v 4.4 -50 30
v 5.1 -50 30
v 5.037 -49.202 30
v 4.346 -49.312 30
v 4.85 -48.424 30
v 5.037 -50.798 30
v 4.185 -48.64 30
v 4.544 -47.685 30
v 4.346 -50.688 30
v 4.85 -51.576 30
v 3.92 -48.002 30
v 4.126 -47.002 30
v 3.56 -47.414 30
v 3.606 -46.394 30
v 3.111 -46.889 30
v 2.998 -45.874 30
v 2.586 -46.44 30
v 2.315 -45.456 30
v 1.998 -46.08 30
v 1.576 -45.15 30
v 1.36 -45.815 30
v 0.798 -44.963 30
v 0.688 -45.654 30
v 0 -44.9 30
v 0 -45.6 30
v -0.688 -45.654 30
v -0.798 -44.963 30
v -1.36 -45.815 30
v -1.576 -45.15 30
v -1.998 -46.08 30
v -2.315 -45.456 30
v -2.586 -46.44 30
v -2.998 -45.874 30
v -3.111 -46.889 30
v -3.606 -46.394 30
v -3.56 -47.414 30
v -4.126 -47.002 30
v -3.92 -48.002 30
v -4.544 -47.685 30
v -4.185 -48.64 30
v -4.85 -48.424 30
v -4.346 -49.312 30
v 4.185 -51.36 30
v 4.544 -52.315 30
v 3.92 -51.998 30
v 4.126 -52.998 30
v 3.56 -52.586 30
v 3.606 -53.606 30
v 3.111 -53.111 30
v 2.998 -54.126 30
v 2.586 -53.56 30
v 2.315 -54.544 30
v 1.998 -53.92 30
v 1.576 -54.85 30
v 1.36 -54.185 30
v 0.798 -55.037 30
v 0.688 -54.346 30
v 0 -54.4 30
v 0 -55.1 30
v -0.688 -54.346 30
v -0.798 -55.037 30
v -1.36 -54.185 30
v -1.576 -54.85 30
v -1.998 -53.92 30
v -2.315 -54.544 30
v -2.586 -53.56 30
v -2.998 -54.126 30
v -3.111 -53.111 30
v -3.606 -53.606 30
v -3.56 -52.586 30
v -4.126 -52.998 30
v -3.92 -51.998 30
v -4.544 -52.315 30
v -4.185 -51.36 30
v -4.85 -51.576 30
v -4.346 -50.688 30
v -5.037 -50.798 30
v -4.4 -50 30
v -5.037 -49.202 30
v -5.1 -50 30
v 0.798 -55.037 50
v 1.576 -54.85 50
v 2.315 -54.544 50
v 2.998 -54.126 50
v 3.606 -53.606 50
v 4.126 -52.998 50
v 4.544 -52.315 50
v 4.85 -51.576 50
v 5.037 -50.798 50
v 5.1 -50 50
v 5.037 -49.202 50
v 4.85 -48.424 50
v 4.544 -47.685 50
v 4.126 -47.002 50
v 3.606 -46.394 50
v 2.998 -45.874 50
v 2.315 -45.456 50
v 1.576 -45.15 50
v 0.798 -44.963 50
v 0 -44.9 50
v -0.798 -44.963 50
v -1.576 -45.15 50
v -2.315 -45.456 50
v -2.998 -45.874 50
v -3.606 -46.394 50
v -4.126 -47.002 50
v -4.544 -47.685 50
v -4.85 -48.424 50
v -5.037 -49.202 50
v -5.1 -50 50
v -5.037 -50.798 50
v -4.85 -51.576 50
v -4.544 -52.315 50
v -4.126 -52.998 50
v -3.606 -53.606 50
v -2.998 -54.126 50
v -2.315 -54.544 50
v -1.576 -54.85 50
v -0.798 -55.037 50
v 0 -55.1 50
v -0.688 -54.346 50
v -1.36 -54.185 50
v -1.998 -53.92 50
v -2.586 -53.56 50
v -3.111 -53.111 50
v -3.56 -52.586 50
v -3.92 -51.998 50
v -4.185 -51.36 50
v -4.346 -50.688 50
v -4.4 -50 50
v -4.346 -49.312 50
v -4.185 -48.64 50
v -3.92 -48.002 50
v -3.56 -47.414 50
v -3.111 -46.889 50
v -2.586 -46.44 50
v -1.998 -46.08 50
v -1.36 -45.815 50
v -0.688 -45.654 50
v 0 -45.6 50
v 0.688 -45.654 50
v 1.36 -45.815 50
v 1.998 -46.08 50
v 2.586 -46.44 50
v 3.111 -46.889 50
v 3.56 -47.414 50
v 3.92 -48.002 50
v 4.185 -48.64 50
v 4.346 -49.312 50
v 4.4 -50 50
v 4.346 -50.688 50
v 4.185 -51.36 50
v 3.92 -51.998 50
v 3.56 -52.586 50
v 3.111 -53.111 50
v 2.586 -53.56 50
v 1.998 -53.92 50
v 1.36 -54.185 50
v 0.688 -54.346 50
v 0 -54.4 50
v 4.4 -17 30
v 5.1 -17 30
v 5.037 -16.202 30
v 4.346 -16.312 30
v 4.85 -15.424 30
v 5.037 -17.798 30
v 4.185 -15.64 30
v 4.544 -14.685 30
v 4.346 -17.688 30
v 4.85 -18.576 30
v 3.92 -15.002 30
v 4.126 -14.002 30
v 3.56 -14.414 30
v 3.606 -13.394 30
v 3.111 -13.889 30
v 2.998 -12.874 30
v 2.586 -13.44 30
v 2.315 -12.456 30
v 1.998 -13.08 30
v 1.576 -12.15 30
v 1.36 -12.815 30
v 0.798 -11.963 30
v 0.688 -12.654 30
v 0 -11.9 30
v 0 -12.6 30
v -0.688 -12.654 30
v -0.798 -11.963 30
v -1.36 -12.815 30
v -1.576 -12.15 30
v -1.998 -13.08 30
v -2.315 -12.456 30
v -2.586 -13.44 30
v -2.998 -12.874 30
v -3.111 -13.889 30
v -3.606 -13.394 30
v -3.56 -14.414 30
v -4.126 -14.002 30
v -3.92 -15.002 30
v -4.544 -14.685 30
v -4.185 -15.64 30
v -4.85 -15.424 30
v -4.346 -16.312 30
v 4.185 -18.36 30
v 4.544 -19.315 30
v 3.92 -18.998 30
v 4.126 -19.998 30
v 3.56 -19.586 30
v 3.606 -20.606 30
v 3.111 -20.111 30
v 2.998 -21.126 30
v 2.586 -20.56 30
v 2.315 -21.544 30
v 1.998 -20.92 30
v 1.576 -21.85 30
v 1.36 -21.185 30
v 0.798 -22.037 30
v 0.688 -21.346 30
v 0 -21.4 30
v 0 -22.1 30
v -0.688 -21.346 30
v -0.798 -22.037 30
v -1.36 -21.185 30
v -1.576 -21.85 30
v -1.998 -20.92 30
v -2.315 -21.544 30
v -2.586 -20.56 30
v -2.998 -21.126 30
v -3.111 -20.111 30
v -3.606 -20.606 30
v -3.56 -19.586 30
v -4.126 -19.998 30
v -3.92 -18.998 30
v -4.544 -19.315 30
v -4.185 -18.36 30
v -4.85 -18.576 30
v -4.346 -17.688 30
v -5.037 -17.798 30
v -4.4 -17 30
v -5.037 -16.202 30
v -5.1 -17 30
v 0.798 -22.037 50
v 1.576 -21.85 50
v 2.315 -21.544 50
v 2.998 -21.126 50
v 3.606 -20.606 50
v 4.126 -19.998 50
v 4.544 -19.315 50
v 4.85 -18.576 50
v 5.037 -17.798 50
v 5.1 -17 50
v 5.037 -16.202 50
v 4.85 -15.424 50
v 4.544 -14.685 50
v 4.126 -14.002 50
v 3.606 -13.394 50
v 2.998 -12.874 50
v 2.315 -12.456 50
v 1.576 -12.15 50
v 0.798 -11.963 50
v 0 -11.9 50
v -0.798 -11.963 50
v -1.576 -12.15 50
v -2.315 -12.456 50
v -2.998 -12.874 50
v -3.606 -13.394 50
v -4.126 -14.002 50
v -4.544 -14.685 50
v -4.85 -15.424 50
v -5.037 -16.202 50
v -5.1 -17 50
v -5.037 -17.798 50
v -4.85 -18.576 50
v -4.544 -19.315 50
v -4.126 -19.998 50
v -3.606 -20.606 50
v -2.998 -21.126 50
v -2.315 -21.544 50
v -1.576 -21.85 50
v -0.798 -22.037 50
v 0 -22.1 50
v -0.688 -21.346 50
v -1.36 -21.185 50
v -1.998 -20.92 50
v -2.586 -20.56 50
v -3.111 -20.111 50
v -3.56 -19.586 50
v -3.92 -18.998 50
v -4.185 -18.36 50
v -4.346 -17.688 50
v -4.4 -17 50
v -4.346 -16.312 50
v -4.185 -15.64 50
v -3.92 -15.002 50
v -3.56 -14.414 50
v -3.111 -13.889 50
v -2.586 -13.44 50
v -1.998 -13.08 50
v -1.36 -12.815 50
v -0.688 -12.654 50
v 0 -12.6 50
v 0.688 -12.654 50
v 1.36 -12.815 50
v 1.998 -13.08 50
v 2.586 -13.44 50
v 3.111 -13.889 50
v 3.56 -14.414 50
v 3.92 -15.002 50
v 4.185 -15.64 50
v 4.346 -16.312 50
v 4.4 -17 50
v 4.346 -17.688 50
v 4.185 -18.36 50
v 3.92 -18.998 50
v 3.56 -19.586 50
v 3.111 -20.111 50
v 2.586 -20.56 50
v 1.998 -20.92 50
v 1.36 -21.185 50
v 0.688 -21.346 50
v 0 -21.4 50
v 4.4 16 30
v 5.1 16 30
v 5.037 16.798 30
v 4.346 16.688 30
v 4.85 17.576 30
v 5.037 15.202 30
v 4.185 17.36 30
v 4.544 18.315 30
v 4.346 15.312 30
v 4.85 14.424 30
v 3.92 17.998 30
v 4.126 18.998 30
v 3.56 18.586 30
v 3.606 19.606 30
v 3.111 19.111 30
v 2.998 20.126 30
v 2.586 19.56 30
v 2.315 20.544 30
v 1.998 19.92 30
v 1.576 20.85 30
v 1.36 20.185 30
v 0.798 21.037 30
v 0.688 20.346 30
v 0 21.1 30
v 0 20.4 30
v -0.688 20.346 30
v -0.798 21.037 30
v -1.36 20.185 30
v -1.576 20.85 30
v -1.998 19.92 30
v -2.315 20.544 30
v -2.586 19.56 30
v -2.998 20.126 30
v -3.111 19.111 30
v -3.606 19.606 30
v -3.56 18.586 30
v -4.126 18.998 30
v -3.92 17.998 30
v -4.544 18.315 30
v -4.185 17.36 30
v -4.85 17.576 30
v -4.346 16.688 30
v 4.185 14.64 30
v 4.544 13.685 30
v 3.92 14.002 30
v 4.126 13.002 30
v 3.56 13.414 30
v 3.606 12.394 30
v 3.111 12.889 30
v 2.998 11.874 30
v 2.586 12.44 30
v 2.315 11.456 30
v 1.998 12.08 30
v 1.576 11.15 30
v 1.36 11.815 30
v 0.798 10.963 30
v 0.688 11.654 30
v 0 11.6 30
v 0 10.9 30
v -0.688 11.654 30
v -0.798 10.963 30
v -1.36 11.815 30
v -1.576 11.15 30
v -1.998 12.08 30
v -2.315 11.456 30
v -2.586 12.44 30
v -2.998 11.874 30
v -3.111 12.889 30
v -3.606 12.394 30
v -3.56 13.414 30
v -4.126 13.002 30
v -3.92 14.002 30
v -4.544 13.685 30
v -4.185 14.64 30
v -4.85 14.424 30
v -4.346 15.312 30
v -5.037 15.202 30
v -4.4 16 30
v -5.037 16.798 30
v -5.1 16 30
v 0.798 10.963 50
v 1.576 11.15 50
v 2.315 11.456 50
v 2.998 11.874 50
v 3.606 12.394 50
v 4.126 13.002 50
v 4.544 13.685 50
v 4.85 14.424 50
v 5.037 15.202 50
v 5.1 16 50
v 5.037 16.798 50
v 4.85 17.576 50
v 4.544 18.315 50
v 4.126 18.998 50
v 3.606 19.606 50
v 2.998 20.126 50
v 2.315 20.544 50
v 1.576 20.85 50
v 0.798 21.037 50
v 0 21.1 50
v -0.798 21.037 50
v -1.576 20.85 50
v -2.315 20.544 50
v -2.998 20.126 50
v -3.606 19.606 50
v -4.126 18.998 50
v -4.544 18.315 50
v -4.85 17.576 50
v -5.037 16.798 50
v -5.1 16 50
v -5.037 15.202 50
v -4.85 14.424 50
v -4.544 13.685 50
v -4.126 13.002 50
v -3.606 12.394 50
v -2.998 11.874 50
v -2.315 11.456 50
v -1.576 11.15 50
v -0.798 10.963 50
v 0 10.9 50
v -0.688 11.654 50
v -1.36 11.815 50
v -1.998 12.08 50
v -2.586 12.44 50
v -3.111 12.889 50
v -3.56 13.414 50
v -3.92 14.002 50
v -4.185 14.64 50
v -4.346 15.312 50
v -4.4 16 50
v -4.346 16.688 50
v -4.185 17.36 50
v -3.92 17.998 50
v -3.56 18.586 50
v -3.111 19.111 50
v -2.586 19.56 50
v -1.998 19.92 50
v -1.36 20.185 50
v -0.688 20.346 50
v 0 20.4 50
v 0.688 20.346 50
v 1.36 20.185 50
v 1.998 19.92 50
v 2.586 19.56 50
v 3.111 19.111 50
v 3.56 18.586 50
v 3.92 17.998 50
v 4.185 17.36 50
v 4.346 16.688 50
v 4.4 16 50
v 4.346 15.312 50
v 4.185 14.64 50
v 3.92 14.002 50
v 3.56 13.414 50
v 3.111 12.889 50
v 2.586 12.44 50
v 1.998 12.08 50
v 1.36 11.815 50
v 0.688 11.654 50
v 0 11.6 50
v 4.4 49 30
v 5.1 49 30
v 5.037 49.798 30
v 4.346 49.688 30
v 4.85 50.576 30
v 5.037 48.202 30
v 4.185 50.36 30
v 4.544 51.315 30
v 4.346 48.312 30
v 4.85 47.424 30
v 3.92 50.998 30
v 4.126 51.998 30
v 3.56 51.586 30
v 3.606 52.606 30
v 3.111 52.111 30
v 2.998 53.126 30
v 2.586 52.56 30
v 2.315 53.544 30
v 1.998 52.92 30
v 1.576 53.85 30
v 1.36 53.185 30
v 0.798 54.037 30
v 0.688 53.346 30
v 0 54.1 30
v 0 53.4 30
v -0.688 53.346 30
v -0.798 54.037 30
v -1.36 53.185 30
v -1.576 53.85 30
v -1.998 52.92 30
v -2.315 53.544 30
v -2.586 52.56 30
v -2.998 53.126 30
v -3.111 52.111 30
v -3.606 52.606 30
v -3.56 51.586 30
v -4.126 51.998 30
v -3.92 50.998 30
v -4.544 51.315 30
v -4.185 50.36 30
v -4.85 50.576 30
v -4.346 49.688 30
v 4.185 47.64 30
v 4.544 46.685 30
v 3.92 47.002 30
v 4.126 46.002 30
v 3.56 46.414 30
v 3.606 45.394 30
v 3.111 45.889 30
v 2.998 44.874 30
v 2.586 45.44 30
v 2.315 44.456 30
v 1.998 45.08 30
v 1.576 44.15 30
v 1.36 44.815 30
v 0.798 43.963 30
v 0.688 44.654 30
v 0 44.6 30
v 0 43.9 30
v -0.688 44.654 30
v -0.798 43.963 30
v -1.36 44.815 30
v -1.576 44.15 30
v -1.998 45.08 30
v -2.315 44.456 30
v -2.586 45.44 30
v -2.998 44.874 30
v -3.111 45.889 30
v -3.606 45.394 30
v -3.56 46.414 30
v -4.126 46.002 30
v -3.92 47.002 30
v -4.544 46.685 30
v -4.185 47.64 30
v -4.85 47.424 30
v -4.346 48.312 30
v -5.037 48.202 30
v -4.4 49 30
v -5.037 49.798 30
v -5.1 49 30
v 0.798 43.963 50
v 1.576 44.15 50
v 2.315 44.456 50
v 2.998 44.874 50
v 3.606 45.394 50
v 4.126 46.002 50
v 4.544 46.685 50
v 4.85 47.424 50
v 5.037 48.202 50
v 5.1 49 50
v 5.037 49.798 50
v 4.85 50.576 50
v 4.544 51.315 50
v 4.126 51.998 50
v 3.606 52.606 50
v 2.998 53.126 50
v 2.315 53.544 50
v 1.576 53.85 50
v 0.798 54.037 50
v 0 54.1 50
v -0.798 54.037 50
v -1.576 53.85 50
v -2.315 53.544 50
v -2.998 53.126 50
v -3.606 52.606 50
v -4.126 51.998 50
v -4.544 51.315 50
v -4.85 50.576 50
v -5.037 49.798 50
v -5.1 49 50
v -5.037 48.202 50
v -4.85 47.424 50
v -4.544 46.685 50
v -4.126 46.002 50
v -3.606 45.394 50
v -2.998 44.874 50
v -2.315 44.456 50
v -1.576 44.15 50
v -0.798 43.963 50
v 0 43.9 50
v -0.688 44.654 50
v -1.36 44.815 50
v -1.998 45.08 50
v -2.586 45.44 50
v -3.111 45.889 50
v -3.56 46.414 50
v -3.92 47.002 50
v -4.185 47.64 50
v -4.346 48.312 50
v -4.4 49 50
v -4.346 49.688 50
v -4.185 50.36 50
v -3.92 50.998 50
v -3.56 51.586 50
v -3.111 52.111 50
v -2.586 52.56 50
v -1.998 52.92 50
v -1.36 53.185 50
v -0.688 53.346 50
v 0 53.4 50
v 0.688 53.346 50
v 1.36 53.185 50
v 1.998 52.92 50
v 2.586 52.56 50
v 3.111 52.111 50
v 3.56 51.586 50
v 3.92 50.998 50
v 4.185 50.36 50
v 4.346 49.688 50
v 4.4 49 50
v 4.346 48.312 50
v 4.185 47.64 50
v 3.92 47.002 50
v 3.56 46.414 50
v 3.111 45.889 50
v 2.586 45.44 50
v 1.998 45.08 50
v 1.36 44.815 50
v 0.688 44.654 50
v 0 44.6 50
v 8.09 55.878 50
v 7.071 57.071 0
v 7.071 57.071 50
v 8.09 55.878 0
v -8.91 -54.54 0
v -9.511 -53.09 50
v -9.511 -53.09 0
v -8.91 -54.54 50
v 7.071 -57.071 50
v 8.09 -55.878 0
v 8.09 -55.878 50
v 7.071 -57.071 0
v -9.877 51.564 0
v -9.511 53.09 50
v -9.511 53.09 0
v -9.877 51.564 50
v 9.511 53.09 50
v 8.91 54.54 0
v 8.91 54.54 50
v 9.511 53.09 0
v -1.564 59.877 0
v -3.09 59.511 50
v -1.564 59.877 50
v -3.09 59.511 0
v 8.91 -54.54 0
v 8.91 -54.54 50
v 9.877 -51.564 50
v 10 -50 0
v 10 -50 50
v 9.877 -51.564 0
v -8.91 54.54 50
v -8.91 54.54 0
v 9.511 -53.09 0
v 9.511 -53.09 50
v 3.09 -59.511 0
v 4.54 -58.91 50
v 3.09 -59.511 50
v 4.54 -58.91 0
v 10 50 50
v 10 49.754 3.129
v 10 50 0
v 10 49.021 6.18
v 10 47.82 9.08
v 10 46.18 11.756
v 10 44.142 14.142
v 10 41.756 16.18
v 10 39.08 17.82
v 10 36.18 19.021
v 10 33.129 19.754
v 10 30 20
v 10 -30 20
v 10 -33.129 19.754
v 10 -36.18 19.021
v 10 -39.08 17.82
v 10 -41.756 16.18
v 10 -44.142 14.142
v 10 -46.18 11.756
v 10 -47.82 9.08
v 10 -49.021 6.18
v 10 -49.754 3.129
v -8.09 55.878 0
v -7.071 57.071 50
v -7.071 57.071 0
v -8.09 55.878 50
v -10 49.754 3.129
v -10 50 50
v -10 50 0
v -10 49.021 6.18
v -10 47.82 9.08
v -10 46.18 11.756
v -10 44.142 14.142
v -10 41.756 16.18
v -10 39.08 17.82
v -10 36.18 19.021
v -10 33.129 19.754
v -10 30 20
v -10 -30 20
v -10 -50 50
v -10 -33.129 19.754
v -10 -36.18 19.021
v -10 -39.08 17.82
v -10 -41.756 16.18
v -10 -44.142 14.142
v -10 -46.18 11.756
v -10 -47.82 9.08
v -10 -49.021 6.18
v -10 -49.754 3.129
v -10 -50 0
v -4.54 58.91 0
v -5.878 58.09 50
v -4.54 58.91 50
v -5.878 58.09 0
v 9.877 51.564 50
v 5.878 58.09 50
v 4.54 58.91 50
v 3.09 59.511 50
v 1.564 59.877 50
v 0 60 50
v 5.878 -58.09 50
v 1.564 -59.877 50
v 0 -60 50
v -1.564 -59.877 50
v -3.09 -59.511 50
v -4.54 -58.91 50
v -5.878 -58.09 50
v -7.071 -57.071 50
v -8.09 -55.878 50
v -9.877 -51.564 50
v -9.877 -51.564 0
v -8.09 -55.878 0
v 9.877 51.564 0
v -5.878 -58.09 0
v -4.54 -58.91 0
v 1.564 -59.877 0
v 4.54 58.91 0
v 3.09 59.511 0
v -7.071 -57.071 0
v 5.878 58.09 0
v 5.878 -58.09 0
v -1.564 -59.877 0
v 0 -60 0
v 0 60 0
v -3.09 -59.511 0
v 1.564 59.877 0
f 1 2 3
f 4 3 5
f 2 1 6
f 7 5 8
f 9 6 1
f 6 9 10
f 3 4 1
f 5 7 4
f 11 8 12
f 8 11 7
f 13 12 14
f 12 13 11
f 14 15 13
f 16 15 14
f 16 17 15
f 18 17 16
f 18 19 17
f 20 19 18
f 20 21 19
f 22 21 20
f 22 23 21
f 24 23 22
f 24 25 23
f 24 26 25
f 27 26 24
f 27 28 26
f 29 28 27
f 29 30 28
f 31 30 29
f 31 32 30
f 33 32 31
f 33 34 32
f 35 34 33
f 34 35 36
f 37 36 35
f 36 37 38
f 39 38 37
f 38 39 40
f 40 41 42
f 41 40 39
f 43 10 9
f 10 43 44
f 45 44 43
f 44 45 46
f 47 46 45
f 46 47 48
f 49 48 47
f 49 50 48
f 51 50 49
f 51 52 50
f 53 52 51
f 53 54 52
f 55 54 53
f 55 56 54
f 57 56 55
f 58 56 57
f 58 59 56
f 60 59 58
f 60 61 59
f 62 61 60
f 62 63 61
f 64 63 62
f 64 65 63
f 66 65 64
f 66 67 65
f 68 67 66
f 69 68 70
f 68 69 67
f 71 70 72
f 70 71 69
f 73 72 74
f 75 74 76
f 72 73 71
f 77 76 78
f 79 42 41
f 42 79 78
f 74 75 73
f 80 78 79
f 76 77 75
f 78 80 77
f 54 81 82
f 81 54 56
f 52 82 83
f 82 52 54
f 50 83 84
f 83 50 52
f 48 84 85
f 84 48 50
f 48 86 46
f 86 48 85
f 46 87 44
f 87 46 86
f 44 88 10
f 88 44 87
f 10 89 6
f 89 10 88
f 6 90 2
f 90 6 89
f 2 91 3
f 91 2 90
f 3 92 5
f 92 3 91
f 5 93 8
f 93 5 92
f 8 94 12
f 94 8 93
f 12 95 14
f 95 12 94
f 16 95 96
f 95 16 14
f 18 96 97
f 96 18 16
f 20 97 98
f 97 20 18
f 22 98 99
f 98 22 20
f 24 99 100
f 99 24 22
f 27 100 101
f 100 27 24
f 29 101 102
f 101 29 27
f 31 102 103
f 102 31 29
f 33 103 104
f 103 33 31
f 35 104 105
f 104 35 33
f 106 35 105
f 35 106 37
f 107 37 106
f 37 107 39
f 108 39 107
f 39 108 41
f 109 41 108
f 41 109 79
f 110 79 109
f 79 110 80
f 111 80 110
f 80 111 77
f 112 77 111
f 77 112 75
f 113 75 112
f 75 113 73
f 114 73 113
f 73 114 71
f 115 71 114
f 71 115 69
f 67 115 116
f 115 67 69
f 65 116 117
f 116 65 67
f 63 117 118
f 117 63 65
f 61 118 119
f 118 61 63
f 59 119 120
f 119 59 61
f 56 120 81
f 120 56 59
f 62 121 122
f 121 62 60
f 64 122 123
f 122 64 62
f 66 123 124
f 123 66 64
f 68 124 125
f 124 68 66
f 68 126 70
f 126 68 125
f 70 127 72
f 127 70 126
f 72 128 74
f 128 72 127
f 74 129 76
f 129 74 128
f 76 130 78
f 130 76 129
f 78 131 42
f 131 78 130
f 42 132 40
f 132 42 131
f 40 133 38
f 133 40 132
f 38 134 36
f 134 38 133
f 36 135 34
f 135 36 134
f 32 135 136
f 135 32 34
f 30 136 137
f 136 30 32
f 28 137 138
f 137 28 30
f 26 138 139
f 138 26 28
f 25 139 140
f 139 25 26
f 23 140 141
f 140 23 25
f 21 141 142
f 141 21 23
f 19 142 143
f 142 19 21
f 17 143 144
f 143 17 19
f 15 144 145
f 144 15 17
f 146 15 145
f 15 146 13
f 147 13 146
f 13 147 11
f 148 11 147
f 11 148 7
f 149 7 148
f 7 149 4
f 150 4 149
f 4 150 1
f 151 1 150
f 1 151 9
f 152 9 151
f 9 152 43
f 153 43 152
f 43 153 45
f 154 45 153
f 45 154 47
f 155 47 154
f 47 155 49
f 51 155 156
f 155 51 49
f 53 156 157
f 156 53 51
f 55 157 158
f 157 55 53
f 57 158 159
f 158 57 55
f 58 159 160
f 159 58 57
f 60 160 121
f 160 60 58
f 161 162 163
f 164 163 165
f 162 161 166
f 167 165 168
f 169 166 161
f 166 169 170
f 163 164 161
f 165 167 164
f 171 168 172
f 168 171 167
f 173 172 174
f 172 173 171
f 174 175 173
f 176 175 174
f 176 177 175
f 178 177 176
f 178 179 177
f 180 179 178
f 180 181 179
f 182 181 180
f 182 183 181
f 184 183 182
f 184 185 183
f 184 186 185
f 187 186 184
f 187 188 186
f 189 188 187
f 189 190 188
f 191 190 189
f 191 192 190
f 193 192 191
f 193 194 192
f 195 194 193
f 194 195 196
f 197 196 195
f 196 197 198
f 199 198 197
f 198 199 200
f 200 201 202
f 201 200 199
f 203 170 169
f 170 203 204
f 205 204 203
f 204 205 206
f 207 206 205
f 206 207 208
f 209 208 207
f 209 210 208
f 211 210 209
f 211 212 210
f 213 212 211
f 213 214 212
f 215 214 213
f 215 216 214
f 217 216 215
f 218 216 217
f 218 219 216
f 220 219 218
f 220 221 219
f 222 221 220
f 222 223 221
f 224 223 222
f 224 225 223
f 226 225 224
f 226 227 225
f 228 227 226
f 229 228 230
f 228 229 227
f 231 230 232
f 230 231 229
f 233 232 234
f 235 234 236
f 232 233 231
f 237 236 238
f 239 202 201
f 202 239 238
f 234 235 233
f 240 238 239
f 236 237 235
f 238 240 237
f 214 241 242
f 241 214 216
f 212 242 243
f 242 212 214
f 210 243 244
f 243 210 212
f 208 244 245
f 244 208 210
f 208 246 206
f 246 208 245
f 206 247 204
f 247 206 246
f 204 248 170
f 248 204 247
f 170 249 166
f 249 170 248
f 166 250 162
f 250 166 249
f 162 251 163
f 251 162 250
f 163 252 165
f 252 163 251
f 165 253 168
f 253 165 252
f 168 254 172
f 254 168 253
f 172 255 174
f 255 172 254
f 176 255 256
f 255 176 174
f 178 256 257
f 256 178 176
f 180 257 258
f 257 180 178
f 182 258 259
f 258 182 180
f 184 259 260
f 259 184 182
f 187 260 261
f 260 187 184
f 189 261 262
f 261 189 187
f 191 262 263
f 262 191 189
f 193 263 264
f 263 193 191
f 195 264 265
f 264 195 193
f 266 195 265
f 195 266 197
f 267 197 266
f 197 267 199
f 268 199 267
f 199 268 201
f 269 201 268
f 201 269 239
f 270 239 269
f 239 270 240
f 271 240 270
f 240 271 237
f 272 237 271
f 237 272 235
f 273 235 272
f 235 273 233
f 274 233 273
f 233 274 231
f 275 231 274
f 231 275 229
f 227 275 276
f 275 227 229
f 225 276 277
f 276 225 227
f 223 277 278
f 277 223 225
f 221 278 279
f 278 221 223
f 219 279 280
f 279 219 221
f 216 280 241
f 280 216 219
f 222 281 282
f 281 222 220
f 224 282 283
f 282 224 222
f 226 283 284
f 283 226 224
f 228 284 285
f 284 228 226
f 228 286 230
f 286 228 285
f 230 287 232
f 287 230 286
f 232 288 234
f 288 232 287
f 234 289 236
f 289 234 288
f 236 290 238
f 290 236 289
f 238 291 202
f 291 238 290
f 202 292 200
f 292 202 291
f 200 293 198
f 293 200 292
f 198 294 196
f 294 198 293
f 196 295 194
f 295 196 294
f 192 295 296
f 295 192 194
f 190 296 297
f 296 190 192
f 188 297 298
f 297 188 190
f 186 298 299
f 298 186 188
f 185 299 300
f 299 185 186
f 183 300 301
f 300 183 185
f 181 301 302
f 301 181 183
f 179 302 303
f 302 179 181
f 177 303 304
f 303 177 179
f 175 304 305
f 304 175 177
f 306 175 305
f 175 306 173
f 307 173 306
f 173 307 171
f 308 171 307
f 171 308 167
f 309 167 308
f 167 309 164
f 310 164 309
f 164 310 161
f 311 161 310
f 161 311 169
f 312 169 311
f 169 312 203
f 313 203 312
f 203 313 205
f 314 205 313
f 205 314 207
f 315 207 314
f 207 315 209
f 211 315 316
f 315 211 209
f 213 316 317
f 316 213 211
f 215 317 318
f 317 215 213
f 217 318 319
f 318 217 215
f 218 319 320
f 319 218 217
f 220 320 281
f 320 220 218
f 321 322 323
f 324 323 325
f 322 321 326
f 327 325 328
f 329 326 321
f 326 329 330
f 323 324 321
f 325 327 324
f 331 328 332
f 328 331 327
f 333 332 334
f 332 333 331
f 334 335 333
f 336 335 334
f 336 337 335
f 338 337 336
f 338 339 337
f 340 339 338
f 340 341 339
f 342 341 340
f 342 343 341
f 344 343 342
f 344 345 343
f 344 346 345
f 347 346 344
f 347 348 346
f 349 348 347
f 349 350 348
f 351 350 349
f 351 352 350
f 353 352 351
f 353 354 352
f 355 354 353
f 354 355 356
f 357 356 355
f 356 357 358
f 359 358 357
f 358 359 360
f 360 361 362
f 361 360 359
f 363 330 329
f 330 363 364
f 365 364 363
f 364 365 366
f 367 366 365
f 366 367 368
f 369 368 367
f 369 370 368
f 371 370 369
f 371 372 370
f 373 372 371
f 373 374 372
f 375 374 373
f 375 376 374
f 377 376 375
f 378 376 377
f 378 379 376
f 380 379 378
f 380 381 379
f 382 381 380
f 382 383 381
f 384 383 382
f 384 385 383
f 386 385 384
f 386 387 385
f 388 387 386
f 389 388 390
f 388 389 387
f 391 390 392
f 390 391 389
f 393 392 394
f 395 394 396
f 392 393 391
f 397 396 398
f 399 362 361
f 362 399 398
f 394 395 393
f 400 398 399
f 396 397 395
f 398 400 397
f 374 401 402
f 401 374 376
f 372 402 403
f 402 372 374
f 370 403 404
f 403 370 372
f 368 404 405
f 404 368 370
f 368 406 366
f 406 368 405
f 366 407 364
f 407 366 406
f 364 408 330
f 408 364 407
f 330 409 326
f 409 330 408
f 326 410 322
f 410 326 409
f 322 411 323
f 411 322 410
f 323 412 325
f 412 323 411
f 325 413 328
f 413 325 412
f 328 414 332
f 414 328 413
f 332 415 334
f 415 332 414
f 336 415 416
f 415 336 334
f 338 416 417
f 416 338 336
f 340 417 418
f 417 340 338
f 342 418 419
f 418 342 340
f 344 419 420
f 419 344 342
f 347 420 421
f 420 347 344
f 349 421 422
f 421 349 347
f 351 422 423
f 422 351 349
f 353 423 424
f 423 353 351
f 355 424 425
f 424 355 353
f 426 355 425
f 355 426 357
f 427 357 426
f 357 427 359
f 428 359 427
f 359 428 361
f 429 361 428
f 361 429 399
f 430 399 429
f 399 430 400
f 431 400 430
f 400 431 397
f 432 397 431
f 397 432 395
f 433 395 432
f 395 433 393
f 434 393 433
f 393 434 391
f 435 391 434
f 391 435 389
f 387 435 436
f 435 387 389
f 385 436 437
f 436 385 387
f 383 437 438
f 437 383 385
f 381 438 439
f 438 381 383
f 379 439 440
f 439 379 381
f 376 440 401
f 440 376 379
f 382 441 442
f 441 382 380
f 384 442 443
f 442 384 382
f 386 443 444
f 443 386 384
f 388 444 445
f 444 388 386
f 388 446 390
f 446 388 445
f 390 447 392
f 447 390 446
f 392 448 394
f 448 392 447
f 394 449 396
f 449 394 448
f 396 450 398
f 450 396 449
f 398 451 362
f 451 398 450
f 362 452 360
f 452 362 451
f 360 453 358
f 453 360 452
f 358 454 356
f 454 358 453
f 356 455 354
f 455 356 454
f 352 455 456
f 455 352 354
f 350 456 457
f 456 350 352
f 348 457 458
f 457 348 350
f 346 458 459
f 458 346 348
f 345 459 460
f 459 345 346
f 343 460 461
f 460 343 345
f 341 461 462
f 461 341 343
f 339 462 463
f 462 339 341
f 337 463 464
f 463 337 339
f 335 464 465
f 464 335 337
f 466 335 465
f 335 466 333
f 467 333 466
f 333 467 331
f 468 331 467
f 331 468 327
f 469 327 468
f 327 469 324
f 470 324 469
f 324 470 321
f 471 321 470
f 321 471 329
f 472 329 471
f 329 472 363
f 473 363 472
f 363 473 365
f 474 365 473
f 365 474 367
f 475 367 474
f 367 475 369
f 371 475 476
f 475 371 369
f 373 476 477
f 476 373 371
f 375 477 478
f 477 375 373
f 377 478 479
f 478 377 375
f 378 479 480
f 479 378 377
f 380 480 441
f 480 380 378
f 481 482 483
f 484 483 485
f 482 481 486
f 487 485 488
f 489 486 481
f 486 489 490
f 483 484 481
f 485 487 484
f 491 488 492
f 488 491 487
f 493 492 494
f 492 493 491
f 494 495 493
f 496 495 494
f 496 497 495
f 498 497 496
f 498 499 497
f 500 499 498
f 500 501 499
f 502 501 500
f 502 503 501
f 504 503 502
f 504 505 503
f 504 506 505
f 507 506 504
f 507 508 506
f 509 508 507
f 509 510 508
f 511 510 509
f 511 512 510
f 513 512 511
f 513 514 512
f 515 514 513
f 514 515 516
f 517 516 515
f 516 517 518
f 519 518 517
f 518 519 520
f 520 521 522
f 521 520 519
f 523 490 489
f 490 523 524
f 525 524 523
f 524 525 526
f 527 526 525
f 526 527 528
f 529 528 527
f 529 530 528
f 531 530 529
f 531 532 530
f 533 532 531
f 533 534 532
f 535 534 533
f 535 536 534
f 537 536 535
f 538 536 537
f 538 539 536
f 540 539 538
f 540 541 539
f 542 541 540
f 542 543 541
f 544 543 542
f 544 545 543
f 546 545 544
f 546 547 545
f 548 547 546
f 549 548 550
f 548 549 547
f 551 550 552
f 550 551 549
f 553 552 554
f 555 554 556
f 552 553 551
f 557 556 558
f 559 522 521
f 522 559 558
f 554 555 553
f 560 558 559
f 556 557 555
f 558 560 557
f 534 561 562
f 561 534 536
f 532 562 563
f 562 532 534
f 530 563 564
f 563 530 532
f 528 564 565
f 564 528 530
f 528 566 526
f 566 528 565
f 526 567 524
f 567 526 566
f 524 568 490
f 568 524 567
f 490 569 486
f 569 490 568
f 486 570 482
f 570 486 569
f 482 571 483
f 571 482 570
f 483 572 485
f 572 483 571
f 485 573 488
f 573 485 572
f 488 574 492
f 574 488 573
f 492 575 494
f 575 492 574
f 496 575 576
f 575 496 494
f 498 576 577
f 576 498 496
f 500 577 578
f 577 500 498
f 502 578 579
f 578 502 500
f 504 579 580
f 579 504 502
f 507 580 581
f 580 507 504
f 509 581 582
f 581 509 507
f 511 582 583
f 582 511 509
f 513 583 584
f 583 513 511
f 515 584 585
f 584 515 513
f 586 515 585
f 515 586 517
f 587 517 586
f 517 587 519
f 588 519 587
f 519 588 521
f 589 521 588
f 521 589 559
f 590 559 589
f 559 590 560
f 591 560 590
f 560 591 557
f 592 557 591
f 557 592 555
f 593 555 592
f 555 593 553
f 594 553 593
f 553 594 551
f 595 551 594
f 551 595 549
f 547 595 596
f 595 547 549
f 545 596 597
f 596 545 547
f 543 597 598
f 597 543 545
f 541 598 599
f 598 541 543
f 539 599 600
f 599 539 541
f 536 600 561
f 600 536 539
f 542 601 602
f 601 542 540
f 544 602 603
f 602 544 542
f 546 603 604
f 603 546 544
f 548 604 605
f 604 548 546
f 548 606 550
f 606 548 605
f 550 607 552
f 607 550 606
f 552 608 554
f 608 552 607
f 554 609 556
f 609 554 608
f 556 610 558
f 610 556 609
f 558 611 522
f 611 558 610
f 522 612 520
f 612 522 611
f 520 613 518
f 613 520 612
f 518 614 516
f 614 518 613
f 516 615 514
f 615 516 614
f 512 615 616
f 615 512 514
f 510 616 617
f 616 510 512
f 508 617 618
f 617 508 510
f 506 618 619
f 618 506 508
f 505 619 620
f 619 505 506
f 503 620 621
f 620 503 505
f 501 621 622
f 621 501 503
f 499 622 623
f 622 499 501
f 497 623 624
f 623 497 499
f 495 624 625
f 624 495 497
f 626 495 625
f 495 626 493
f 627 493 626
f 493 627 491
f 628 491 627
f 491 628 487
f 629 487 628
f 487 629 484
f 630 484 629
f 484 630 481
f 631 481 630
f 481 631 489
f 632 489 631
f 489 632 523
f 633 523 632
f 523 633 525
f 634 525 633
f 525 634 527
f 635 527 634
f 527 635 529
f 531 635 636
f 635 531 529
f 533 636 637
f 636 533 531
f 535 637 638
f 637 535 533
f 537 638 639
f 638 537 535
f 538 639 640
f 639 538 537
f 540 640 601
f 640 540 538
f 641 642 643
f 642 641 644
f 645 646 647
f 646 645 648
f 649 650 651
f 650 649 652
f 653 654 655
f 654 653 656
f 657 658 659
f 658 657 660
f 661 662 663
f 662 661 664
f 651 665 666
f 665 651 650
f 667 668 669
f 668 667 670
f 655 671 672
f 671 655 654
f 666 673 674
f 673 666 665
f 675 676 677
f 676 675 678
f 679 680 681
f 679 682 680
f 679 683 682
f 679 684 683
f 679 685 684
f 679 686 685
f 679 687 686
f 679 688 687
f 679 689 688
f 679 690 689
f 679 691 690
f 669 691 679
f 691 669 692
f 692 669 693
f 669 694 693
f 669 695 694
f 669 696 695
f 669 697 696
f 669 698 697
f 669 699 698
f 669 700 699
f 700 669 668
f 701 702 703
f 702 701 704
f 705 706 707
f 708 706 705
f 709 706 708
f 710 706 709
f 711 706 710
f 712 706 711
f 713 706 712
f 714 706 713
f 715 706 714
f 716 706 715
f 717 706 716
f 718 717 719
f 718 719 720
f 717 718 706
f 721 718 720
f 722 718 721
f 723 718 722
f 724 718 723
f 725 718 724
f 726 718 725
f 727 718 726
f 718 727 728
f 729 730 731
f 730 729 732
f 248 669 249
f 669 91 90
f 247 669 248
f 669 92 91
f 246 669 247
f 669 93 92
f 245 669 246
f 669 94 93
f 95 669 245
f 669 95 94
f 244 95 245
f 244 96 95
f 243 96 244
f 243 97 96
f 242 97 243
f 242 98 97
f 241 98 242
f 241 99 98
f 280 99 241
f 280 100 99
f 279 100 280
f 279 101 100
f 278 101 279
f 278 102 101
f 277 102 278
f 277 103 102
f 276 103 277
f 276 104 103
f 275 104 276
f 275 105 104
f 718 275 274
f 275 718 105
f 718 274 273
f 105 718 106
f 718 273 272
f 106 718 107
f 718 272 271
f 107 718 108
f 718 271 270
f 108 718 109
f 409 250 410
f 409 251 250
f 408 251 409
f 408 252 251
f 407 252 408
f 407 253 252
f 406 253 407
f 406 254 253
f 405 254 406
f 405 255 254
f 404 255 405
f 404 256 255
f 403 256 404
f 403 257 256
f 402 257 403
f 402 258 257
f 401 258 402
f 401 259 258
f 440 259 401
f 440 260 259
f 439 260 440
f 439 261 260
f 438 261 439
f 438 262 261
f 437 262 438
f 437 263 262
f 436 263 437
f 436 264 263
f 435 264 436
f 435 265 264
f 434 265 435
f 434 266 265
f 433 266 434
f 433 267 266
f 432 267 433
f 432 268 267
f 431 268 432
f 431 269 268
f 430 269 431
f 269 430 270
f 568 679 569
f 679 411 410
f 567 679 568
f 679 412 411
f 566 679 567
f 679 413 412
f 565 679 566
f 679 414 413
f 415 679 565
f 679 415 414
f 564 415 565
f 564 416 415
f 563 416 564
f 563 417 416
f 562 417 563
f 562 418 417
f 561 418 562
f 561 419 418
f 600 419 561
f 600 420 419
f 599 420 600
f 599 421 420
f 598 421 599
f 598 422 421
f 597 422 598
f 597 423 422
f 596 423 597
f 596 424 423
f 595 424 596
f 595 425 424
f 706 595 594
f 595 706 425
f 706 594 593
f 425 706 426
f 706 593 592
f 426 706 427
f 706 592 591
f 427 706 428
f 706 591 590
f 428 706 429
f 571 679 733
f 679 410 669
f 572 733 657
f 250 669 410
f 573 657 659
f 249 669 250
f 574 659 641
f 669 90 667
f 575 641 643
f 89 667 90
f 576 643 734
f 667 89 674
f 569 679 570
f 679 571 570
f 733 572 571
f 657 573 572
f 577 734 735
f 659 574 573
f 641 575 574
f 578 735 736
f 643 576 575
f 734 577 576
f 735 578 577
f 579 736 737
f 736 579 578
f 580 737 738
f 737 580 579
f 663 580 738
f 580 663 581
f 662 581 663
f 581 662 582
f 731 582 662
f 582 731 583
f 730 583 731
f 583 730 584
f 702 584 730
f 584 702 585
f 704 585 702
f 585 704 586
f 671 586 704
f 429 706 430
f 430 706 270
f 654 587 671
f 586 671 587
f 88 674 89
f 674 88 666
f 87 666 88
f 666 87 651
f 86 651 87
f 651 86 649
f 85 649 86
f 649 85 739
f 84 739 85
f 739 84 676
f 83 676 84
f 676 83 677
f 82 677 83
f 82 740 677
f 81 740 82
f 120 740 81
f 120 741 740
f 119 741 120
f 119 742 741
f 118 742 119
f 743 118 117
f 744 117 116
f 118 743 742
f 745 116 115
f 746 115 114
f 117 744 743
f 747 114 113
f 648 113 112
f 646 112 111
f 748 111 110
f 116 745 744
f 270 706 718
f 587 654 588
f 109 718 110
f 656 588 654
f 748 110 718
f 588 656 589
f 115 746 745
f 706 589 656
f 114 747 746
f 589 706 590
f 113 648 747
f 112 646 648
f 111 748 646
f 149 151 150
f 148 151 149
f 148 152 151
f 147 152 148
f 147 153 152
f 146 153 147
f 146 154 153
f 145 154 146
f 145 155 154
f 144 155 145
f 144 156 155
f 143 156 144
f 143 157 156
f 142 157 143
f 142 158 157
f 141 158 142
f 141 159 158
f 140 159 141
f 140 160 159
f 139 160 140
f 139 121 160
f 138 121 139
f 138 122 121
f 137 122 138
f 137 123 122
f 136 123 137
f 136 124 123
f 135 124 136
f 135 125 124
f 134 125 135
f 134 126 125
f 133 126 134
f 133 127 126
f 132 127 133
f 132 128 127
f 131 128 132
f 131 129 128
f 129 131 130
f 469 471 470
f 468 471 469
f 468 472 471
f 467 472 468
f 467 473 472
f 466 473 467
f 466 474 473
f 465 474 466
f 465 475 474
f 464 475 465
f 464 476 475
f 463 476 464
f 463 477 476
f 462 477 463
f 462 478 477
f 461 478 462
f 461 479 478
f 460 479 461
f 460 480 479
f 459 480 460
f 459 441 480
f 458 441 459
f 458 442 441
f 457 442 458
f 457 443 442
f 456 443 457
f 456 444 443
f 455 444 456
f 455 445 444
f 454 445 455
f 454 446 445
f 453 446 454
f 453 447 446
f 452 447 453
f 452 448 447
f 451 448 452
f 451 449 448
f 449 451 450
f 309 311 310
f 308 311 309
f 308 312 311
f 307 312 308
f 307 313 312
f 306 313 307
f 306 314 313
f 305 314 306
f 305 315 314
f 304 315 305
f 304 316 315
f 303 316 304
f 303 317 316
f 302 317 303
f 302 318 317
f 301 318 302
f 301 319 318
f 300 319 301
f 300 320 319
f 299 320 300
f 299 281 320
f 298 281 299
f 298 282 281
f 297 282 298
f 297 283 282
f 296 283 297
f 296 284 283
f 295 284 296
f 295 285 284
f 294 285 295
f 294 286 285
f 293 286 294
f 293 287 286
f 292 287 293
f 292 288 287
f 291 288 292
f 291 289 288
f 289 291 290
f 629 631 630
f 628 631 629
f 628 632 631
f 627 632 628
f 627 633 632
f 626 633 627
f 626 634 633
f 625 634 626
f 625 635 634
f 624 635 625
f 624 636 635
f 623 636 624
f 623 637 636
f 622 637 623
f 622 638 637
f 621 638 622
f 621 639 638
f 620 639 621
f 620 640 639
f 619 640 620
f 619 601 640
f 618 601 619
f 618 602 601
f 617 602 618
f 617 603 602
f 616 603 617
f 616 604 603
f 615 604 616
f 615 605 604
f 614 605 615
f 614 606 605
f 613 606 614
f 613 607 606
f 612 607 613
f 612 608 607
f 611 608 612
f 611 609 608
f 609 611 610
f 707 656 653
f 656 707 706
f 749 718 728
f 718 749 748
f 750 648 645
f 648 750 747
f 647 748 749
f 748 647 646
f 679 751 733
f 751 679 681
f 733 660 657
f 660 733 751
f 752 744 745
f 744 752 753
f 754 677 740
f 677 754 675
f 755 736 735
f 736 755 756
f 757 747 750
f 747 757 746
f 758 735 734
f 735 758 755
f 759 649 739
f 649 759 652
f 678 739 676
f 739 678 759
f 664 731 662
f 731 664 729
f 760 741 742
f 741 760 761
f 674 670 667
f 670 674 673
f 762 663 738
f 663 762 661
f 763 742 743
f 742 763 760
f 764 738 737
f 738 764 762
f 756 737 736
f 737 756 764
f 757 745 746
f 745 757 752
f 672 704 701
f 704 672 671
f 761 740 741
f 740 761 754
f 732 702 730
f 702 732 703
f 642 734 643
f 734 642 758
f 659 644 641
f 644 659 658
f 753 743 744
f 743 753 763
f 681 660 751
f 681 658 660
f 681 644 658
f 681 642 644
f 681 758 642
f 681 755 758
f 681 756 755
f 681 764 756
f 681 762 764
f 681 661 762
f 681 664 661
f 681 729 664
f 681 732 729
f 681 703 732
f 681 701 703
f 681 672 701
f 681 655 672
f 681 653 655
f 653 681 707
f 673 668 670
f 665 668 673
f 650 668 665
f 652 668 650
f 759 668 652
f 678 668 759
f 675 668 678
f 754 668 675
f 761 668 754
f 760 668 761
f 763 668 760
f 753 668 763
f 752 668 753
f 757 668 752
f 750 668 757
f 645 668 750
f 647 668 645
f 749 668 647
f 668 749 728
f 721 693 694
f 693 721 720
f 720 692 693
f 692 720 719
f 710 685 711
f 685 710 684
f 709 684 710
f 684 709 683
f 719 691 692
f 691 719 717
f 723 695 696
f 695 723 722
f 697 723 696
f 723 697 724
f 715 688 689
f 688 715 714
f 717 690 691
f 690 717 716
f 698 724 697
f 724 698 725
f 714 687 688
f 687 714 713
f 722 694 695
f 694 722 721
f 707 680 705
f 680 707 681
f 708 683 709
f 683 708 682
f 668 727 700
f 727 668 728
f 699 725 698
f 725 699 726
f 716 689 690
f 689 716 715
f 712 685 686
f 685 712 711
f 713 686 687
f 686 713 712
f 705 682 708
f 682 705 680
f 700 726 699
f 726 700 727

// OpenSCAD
$fn=40;

module edge() {
    linear_extrude(50) union() {
        translate([0,-50]) circle(10);
        square([20,100],true);
        translate([0,50]) circle(10);
    }
}

module dent() {
    linear_extrude(60) union() {
        translate([0,-30]) circle(20);
        square([40,60],true);
        translate([0,30]) circle(20);
    }
}

module pipe10() {
    linear_extrude(400) difference() {
        circle(5.1);
        circle(4.40);
    }
}


difference() {
    edge();
    for(x = [0 : 1 : 3]) {
        translate([0, -50 + 33 * x, 30]) pipe10();
    }
    translate([-20,0,0]) rotate([0,90,0]) dent();
}
